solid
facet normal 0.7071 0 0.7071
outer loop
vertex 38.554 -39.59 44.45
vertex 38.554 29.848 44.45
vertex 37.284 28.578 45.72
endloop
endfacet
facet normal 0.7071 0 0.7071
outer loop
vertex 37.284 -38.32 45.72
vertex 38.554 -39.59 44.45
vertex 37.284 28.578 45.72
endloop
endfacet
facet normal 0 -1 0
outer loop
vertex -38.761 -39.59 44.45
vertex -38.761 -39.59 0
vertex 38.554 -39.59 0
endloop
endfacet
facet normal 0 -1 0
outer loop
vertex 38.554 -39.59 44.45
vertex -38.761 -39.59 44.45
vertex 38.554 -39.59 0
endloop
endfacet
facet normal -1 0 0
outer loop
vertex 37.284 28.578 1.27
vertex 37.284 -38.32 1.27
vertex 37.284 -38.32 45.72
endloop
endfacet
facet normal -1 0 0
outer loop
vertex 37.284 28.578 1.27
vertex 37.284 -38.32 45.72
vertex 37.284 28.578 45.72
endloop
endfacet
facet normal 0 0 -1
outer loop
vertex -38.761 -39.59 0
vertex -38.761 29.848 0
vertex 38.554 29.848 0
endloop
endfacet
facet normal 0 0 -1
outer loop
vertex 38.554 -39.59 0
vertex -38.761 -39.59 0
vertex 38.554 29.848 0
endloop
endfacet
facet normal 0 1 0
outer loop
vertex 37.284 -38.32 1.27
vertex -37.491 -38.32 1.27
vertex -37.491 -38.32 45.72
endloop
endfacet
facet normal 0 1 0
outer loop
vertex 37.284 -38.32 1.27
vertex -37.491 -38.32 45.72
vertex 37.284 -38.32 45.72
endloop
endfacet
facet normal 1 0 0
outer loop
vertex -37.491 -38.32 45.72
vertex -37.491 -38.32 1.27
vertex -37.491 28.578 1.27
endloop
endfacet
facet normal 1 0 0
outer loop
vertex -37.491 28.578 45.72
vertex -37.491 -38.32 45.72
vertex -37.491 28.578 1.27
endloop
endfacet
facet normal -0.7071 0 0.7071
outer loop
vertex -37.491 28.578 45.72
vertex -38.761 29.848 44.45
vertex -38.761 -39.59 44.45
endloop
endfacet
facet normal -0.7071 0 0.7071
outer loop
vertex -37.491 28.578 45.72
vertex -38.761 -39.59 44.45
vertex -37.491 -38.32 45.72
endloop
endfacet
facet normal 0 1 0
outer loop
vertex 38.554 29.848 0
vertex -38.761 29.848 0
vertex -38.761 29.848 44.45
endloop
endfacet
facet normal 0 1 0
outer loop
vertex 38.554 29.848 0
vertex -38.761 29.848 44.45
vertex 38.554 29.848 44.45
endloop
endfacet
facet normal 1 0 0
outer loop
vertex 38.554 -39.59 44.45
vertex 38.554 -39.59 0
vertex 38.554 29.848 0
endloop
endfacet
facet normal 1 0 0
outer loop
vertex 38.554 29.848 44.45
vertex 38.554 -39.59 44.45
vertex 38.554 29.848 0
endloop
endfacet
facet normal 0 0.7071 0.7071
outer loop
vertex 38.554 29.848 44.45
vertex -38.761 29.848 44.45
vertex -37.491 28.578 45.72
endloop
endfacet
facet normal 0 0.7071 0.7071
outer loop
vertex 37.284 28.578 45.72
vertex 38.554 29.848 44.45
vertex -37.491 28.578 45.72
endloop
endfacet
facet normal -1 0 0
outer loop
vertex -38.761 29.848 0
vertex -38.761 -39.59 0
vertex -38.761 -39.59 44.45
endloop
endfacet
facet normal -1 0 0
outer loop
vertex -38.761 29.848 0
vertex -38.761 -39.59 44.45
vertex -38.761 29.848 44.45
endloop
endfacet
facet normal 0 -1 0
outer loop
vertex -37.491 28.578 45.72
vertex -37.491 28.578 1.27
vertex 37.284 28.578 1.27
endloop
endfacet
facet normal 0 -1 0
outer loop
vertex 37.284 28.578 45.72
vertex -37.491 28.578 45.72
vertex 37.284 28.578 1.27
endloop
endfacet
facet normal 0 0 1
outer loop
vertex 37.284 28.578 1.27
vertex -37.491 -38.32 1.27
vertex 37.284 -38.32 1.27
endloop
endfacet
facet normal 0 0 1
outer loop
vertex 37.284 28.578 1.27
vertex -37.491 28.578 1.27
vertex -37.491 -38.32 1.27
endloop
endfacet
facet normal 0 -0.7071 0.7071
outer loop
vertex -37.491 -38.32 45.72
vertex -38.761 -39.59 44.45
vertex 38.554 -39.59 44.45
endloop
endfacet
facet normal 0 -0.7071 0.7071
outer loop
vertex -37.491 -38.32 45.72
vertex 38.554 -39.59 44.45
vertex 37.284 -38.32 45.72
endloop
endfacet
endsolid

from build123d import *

# Parameters (mm, degrees)
F0_W        = 77.315364033
F0_H        = 69.4387331605
F1_DEPTH    = 50.8
F2_T        = -1.27
F3_T1_DEPTH = 109.9757379802
F3_T3_DEPTH = 102.0991071077


# Not quite as in the source:
# - a fillet or chamfer that OpenCascade refuses, or shapes differently, is made with other operations: its cross-section is extruded or revolved along the edge and cut away or added
# - the program builds the solid bodies; features that only make, move or delete a surface that nothing else refers to are left out


with BuildPart() as f1:
    # F0 (on Top) → F1 (new body)
    with BuildSketch(Plane.XY):
        with Locations((-0.1036394387, -4.8710741103)):
            Rectangle(F0_W, F0_H)
    extrude(amount=F1_DEPTH)

    # F2
    f2_openings = [f1.faces().sort_by_distance(p)[0] for p in [
        (-0.103639, -4.871074, 50.8),
    ]]
    offset(amount=F2_T, openings=f2_openings)

    # F3: chamfer of 6.35 on 4 edges, made by hand

    # F3_s2 → F3_t1 (cut)
    with BuildSketch(Plane.YZ.offset(-55.0915084288)):
        Polygon((-39.5904406905, 44.45), (-33.2404406905, 50.8), (-39.5904406905, 50.8), align=None)
        Polygon((29.84829247, 44.45), (23.49829247, 50.8), (29.84829247, 50.8), align=None)
    extrude(amount=F3_T1_DEPTH, mode=Mode.SUBTRACT)

    # F3_s4 → F3_t3 (cut)
    with BuildSketch(Plane.XZ.offset(-46.1784794436)):
        Polygon((-38.7613214552, 44.45), (-32.4113214552, 50.8), (-38.7613214552, 50.8), align=None)
        Polygon((38.5540425777, 44.45), (32.2040425777, 50.8), (38.5540425777, 50.8), align=None)
    extrude(amount=F3_T3_DEPTH, mode=Mode.SUBTRACT)


solid = f1.part
